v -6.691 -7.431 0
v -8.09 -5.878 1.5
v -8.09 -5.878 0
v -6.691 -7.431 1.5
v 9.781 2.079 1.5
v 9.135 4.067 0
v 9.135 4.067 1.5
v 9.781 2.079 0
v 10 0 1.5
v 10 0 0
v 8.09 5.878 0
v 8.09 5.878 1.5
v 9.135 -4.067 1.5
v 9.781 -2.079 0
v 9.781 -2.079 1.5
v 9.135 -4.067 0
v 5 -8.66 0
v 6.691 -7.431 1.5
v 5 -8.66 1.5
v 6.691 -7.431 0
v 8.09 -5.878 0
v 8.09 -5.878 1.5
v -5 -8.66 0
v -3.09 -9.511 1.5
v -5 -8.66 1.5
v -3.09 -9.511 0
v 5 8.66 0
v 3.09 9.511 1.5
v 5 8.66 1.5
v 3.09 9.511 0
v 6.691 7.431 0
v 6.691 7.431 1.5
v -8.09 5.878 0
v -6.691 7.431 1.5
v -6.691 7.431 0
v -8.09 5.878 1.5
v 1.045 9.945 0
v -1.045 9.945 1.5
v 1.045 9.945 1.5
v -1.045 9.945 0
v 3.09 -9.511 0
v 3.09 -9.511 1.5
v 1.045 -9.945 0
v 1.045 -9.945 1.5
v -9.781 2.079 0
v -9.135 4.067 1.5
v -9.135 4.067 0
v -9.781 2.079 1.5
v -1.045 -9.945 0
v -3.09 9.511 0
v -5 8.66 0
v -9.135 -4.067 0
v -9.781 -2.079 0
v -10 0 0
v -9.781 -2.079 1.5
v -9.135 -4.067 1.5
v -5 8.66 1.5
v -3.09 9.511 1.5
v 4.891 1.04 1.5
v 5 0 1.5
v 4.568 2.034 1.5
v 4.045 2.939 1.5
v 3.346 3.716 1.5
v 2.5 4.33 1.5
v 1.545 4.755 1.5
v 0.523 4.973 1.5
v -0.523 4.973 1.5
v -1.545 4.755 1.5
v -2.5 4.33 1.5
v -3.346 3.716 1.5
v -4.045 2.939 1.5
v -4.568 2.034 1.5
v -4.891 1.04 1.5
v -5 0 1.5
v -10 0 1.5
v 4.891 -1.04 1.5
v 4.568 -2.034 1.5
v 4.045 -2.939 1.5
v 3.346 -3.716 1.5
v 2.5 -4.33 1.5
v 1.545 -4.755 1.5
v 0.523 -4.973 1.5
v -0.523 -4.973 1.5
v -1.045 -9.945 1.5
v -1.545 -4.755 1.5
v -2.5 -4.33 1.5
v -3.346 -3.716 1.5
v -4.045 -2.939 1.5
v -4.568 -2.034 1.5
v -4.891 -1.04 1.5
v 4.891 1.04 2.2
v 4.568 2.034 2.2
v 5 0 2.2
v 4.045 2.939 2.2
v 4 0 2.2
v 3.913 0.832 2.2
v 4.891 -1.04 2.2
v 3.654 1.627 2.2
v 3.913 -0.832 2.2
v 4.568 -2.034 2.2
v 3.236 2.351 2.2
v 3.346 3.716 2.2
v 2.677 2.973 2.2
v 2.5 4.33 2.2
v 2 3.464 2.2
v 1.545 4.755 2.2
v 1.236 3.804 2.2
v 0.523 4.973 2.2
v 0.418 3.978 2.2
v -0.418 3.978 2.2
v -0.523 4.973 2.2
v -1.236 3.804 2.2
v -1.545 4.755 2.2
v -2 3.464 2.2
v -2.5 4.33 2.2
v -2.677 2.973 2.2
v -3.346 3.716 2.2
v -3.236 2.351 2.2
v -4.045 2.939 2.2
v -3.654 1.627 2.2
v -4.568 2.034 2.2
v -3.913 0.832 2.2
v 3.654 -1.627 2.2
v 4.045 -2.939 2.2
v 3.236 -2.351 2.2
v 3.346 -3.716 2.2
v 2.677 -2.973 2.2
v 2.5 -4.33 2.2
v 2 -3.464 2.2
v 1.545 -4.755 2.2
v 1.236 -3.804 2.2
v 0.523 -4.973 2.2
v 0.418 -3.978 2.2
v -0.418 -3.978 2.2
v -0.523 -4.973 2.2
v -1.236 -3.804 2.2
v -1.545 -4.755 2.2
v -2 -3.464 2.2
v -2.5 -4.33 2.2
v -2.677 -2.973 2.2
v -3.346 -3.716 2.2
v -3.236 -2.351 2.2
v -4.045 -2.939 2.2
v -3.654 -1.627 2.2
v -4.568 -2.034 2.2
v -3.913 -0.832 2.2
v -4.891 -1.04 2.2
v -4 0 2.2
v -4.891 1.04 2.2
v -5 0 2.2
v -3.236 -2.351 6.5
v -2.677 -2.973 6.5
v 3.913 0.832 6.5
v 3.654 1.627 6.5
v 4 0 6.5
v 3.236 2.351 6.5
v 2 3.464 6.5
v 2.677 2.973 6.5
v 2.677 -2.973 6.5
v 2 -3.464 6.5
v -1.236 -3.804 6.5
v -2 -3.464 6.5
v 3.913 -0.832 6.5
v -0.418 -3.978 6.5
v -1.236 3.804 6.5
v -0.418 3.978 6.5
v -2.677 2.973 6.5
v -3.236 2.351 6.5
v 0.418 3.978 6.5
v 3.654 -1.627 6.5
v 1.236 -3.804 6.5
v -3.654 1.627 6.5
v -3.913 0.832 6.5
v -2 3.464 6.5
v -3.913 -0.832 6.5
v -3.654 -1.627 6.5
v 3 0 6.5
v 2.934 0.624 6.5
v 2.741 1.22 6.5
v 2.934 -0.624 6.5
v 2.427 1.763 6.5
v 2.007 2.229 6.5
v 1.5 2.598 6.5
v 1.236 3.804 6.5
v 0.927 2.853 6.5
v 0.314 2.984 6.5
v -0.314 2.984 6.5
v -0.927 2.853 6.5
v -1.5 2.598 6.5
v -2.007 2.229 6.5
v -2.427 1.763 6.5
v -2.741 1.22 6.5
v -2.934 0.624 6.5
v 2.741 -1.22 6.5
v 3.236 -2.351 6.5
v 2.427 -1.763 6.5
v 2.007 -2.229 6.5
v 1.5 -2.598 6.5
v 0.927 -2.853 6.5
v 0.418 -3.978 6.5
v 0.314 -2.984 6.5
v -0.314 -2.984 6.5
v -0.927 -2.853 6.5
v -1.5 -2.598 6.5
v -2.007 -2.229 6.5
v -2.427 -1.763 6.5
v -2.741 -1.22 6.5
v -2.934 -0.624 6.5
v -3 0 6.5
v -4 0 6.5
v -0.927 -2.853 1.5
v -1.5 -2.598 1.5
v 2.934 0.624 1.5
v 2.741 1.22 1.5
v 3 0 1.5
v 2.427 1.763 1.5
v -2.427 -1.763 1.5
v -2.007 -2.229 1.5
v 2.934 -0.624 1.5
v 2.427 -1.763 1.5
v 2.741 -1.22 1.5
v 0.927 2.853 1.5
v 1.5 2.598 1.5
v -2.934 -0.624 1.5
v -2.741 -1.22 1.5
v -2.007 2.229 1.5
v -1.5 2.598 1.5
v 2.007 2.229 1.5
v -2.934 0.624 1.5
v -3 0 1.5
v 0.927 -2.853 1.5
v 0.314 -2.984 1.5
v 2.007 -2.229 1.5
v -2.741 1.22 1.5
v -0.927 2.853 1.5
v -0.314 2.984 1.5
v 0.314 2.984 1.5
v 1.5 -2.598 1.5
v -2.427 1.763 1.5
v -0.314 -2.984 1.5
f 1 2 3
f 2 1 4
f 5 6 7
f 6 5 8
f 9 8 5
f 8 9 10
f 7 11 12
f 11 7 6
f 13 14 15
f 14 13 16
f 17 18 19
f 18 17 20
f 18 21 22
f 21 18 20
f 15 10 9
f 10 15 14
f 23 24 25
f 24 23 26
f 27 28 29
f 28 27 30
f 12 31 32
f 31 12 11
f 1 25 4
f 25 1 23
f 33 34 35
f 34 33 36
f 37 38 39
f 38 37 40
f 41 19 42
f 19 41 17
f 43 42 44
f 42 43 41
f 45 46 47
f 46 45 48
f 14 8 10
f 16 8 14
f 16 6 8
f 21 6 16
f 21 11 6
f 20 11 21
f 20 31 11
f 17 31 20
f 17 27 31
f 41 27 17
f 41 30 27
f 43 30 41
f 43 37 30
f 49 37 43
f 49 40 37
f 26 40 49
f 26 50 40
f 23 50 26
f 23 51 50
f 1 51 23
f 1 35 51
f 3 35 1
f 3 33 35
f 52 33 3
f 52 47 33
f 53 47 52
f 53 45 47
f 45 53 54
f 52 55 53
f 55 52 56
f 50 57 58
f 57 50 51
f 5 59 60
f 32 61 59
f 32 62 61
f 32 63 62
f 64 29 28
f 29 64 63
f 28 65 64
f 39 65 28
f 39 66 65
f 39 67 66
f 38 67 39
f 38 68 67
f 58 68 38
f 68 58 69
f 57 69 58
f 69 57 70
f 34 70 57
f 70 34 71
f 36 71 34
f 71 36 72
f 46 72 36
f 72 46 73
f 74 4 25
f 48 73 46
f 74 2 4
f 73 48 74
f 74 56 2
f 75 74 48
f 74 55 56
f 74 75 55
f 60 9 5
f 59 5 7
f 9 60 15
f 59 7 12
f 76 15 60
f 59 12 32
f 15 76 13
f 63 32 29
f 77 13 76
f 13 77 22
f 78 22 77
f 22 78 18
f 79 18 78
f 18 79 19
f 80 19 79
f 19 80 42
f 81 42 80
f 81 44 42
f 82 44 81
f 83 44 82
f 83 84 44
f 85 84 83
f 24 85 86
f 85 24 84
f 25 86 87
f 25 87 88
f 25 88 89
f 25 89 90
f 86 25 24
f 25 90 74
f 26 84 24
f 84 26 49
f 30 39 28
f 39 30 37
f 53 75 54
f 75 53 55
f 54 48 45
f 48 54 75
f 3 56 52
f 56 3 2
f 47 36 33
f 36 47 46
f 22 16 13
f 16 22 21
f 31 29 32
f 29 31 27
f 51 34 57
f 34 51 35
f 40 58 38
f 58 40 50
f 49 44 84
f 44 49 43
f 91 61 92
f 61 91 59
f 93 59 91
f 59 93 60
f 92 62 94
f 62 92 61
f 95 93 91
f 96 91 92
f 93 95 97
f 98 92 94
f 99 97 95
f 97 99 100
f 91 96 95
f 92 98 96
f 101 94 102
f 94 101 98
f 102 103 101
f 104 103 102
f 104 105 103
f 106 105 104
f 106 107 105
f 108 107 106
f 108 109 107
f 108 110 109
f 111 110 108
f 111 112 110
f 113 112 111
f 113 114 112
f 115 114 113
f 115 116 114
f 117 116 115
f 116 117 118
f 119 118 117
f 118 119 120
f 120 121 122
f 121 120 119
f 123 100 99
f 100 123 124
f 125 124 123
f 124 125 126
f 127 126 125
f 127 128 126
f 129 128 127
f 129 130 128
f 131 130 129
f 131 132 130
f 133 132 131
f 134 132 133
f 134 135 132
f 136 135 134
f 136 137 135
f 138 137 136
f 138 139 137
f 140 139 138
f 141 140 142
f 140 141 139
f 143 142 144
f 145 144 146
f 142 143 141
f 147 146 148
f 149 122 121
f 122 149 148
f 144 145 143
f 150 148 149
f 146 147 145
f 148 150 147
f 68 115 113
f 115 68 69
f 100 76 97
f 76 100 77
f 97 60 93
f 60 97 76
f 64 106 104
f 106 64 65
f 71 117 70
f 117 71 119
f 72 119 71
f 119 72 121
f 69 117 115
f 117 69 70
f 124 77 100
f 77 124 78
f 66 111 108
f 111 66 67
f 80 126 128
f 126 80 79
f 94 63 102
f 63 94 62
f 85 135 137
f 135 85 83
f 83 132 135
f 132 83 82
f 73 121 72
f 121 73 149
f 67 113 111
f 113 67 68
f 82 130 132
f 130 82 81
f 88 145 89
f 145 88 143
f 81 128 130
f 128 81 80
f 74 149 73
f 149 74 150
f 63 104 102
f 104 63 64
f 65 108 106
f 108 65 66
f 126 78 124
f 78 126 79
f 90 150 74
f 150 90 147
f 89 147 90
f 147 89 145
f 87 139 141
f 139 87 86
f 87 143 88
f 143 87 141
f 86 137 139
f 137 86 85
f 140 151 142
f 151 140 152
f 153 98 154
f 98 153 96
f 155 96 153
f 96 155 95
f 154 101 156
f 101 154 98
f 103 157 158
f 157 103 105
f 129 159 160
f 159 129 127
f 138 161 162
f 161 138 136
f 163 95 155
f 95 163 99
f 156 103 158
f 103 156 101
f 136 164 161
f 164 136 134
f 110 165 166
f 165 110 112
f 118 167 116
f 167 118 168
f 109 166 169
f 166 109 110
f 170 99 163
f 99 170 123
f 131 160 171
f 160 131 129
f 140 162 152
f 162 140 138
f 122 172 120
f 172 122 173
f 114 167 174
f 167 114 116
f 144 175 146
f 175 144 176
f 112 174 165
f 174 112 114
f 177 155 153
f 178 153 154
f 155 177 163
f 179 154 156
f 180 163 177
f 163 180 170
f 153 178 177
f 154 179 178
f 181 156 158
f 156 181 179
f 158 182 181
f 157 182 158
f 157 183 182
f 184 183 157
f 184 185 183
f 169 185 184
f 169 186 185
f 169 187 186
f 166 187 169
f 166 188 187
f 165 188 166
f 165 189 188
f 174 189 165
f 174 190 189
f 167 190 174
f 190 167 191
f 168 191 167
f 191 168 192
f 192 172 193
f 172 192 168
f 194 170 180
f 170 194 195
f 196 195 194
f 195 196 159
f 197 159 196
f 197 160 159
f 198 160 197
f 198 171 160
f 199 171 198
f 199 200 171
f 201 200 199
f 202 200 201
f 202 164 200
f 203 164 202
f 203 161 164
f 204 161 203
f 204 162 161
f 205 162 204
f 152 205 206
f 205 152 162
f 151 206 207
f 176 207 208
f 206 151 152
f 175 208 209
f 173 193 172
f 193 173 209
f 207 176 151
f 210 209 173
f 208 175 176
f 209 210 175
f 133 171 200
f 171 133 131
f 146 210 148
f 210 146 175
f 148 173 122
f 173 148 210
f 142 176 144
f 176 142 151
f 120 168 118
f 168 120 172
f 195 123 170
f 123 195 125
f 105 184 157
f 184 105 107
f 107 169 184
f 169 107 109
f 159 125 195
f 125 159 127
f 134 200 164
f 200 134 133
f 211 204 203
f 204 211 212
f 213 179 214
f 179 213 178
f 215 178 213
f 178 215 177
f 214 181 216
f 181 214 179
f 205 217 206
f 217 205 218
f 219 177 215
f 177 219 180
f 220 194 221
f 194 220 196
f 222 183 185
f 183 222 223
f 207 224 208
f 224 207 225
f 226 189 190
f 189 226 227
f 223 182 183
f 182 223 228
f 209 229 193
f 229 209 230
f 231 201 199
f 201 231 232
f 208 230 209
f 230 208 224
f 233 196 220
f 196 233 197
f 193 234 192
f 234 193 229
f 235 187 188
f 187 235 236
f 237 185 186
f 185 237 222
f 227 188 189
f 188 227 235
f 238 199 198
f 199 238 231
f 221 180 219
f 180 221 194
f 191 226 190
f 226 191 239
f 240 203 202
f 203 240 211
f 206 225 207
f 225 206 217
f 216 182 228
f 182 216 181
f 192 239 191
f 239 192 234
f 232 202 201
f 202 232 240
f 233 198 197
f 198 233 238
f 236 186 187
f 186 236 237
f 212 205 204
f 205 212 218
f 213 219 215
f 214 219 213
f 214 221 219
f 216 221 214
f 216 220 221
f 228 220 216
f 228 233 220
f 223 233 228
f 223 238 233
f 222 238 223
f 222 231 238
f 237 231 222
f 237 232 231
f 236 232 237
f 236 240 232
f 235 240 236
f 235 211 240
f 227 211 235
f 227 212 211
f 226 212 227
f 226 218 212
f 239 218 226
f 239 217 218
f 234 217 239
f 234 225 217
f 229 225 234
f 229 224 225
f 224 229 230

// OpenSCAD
$fn = 30;
difference() {
  union() {
    cylinder(1.5,d=20,[0,0,0]);
    cylinder(2.2,d=10,[0,0,0]);
    cylinder(6.5,d=8,[0,0,0]);
  }
  #translate ([0,0,1.5]) cylinder(7.0,d=6,[0,0,0]);
}
